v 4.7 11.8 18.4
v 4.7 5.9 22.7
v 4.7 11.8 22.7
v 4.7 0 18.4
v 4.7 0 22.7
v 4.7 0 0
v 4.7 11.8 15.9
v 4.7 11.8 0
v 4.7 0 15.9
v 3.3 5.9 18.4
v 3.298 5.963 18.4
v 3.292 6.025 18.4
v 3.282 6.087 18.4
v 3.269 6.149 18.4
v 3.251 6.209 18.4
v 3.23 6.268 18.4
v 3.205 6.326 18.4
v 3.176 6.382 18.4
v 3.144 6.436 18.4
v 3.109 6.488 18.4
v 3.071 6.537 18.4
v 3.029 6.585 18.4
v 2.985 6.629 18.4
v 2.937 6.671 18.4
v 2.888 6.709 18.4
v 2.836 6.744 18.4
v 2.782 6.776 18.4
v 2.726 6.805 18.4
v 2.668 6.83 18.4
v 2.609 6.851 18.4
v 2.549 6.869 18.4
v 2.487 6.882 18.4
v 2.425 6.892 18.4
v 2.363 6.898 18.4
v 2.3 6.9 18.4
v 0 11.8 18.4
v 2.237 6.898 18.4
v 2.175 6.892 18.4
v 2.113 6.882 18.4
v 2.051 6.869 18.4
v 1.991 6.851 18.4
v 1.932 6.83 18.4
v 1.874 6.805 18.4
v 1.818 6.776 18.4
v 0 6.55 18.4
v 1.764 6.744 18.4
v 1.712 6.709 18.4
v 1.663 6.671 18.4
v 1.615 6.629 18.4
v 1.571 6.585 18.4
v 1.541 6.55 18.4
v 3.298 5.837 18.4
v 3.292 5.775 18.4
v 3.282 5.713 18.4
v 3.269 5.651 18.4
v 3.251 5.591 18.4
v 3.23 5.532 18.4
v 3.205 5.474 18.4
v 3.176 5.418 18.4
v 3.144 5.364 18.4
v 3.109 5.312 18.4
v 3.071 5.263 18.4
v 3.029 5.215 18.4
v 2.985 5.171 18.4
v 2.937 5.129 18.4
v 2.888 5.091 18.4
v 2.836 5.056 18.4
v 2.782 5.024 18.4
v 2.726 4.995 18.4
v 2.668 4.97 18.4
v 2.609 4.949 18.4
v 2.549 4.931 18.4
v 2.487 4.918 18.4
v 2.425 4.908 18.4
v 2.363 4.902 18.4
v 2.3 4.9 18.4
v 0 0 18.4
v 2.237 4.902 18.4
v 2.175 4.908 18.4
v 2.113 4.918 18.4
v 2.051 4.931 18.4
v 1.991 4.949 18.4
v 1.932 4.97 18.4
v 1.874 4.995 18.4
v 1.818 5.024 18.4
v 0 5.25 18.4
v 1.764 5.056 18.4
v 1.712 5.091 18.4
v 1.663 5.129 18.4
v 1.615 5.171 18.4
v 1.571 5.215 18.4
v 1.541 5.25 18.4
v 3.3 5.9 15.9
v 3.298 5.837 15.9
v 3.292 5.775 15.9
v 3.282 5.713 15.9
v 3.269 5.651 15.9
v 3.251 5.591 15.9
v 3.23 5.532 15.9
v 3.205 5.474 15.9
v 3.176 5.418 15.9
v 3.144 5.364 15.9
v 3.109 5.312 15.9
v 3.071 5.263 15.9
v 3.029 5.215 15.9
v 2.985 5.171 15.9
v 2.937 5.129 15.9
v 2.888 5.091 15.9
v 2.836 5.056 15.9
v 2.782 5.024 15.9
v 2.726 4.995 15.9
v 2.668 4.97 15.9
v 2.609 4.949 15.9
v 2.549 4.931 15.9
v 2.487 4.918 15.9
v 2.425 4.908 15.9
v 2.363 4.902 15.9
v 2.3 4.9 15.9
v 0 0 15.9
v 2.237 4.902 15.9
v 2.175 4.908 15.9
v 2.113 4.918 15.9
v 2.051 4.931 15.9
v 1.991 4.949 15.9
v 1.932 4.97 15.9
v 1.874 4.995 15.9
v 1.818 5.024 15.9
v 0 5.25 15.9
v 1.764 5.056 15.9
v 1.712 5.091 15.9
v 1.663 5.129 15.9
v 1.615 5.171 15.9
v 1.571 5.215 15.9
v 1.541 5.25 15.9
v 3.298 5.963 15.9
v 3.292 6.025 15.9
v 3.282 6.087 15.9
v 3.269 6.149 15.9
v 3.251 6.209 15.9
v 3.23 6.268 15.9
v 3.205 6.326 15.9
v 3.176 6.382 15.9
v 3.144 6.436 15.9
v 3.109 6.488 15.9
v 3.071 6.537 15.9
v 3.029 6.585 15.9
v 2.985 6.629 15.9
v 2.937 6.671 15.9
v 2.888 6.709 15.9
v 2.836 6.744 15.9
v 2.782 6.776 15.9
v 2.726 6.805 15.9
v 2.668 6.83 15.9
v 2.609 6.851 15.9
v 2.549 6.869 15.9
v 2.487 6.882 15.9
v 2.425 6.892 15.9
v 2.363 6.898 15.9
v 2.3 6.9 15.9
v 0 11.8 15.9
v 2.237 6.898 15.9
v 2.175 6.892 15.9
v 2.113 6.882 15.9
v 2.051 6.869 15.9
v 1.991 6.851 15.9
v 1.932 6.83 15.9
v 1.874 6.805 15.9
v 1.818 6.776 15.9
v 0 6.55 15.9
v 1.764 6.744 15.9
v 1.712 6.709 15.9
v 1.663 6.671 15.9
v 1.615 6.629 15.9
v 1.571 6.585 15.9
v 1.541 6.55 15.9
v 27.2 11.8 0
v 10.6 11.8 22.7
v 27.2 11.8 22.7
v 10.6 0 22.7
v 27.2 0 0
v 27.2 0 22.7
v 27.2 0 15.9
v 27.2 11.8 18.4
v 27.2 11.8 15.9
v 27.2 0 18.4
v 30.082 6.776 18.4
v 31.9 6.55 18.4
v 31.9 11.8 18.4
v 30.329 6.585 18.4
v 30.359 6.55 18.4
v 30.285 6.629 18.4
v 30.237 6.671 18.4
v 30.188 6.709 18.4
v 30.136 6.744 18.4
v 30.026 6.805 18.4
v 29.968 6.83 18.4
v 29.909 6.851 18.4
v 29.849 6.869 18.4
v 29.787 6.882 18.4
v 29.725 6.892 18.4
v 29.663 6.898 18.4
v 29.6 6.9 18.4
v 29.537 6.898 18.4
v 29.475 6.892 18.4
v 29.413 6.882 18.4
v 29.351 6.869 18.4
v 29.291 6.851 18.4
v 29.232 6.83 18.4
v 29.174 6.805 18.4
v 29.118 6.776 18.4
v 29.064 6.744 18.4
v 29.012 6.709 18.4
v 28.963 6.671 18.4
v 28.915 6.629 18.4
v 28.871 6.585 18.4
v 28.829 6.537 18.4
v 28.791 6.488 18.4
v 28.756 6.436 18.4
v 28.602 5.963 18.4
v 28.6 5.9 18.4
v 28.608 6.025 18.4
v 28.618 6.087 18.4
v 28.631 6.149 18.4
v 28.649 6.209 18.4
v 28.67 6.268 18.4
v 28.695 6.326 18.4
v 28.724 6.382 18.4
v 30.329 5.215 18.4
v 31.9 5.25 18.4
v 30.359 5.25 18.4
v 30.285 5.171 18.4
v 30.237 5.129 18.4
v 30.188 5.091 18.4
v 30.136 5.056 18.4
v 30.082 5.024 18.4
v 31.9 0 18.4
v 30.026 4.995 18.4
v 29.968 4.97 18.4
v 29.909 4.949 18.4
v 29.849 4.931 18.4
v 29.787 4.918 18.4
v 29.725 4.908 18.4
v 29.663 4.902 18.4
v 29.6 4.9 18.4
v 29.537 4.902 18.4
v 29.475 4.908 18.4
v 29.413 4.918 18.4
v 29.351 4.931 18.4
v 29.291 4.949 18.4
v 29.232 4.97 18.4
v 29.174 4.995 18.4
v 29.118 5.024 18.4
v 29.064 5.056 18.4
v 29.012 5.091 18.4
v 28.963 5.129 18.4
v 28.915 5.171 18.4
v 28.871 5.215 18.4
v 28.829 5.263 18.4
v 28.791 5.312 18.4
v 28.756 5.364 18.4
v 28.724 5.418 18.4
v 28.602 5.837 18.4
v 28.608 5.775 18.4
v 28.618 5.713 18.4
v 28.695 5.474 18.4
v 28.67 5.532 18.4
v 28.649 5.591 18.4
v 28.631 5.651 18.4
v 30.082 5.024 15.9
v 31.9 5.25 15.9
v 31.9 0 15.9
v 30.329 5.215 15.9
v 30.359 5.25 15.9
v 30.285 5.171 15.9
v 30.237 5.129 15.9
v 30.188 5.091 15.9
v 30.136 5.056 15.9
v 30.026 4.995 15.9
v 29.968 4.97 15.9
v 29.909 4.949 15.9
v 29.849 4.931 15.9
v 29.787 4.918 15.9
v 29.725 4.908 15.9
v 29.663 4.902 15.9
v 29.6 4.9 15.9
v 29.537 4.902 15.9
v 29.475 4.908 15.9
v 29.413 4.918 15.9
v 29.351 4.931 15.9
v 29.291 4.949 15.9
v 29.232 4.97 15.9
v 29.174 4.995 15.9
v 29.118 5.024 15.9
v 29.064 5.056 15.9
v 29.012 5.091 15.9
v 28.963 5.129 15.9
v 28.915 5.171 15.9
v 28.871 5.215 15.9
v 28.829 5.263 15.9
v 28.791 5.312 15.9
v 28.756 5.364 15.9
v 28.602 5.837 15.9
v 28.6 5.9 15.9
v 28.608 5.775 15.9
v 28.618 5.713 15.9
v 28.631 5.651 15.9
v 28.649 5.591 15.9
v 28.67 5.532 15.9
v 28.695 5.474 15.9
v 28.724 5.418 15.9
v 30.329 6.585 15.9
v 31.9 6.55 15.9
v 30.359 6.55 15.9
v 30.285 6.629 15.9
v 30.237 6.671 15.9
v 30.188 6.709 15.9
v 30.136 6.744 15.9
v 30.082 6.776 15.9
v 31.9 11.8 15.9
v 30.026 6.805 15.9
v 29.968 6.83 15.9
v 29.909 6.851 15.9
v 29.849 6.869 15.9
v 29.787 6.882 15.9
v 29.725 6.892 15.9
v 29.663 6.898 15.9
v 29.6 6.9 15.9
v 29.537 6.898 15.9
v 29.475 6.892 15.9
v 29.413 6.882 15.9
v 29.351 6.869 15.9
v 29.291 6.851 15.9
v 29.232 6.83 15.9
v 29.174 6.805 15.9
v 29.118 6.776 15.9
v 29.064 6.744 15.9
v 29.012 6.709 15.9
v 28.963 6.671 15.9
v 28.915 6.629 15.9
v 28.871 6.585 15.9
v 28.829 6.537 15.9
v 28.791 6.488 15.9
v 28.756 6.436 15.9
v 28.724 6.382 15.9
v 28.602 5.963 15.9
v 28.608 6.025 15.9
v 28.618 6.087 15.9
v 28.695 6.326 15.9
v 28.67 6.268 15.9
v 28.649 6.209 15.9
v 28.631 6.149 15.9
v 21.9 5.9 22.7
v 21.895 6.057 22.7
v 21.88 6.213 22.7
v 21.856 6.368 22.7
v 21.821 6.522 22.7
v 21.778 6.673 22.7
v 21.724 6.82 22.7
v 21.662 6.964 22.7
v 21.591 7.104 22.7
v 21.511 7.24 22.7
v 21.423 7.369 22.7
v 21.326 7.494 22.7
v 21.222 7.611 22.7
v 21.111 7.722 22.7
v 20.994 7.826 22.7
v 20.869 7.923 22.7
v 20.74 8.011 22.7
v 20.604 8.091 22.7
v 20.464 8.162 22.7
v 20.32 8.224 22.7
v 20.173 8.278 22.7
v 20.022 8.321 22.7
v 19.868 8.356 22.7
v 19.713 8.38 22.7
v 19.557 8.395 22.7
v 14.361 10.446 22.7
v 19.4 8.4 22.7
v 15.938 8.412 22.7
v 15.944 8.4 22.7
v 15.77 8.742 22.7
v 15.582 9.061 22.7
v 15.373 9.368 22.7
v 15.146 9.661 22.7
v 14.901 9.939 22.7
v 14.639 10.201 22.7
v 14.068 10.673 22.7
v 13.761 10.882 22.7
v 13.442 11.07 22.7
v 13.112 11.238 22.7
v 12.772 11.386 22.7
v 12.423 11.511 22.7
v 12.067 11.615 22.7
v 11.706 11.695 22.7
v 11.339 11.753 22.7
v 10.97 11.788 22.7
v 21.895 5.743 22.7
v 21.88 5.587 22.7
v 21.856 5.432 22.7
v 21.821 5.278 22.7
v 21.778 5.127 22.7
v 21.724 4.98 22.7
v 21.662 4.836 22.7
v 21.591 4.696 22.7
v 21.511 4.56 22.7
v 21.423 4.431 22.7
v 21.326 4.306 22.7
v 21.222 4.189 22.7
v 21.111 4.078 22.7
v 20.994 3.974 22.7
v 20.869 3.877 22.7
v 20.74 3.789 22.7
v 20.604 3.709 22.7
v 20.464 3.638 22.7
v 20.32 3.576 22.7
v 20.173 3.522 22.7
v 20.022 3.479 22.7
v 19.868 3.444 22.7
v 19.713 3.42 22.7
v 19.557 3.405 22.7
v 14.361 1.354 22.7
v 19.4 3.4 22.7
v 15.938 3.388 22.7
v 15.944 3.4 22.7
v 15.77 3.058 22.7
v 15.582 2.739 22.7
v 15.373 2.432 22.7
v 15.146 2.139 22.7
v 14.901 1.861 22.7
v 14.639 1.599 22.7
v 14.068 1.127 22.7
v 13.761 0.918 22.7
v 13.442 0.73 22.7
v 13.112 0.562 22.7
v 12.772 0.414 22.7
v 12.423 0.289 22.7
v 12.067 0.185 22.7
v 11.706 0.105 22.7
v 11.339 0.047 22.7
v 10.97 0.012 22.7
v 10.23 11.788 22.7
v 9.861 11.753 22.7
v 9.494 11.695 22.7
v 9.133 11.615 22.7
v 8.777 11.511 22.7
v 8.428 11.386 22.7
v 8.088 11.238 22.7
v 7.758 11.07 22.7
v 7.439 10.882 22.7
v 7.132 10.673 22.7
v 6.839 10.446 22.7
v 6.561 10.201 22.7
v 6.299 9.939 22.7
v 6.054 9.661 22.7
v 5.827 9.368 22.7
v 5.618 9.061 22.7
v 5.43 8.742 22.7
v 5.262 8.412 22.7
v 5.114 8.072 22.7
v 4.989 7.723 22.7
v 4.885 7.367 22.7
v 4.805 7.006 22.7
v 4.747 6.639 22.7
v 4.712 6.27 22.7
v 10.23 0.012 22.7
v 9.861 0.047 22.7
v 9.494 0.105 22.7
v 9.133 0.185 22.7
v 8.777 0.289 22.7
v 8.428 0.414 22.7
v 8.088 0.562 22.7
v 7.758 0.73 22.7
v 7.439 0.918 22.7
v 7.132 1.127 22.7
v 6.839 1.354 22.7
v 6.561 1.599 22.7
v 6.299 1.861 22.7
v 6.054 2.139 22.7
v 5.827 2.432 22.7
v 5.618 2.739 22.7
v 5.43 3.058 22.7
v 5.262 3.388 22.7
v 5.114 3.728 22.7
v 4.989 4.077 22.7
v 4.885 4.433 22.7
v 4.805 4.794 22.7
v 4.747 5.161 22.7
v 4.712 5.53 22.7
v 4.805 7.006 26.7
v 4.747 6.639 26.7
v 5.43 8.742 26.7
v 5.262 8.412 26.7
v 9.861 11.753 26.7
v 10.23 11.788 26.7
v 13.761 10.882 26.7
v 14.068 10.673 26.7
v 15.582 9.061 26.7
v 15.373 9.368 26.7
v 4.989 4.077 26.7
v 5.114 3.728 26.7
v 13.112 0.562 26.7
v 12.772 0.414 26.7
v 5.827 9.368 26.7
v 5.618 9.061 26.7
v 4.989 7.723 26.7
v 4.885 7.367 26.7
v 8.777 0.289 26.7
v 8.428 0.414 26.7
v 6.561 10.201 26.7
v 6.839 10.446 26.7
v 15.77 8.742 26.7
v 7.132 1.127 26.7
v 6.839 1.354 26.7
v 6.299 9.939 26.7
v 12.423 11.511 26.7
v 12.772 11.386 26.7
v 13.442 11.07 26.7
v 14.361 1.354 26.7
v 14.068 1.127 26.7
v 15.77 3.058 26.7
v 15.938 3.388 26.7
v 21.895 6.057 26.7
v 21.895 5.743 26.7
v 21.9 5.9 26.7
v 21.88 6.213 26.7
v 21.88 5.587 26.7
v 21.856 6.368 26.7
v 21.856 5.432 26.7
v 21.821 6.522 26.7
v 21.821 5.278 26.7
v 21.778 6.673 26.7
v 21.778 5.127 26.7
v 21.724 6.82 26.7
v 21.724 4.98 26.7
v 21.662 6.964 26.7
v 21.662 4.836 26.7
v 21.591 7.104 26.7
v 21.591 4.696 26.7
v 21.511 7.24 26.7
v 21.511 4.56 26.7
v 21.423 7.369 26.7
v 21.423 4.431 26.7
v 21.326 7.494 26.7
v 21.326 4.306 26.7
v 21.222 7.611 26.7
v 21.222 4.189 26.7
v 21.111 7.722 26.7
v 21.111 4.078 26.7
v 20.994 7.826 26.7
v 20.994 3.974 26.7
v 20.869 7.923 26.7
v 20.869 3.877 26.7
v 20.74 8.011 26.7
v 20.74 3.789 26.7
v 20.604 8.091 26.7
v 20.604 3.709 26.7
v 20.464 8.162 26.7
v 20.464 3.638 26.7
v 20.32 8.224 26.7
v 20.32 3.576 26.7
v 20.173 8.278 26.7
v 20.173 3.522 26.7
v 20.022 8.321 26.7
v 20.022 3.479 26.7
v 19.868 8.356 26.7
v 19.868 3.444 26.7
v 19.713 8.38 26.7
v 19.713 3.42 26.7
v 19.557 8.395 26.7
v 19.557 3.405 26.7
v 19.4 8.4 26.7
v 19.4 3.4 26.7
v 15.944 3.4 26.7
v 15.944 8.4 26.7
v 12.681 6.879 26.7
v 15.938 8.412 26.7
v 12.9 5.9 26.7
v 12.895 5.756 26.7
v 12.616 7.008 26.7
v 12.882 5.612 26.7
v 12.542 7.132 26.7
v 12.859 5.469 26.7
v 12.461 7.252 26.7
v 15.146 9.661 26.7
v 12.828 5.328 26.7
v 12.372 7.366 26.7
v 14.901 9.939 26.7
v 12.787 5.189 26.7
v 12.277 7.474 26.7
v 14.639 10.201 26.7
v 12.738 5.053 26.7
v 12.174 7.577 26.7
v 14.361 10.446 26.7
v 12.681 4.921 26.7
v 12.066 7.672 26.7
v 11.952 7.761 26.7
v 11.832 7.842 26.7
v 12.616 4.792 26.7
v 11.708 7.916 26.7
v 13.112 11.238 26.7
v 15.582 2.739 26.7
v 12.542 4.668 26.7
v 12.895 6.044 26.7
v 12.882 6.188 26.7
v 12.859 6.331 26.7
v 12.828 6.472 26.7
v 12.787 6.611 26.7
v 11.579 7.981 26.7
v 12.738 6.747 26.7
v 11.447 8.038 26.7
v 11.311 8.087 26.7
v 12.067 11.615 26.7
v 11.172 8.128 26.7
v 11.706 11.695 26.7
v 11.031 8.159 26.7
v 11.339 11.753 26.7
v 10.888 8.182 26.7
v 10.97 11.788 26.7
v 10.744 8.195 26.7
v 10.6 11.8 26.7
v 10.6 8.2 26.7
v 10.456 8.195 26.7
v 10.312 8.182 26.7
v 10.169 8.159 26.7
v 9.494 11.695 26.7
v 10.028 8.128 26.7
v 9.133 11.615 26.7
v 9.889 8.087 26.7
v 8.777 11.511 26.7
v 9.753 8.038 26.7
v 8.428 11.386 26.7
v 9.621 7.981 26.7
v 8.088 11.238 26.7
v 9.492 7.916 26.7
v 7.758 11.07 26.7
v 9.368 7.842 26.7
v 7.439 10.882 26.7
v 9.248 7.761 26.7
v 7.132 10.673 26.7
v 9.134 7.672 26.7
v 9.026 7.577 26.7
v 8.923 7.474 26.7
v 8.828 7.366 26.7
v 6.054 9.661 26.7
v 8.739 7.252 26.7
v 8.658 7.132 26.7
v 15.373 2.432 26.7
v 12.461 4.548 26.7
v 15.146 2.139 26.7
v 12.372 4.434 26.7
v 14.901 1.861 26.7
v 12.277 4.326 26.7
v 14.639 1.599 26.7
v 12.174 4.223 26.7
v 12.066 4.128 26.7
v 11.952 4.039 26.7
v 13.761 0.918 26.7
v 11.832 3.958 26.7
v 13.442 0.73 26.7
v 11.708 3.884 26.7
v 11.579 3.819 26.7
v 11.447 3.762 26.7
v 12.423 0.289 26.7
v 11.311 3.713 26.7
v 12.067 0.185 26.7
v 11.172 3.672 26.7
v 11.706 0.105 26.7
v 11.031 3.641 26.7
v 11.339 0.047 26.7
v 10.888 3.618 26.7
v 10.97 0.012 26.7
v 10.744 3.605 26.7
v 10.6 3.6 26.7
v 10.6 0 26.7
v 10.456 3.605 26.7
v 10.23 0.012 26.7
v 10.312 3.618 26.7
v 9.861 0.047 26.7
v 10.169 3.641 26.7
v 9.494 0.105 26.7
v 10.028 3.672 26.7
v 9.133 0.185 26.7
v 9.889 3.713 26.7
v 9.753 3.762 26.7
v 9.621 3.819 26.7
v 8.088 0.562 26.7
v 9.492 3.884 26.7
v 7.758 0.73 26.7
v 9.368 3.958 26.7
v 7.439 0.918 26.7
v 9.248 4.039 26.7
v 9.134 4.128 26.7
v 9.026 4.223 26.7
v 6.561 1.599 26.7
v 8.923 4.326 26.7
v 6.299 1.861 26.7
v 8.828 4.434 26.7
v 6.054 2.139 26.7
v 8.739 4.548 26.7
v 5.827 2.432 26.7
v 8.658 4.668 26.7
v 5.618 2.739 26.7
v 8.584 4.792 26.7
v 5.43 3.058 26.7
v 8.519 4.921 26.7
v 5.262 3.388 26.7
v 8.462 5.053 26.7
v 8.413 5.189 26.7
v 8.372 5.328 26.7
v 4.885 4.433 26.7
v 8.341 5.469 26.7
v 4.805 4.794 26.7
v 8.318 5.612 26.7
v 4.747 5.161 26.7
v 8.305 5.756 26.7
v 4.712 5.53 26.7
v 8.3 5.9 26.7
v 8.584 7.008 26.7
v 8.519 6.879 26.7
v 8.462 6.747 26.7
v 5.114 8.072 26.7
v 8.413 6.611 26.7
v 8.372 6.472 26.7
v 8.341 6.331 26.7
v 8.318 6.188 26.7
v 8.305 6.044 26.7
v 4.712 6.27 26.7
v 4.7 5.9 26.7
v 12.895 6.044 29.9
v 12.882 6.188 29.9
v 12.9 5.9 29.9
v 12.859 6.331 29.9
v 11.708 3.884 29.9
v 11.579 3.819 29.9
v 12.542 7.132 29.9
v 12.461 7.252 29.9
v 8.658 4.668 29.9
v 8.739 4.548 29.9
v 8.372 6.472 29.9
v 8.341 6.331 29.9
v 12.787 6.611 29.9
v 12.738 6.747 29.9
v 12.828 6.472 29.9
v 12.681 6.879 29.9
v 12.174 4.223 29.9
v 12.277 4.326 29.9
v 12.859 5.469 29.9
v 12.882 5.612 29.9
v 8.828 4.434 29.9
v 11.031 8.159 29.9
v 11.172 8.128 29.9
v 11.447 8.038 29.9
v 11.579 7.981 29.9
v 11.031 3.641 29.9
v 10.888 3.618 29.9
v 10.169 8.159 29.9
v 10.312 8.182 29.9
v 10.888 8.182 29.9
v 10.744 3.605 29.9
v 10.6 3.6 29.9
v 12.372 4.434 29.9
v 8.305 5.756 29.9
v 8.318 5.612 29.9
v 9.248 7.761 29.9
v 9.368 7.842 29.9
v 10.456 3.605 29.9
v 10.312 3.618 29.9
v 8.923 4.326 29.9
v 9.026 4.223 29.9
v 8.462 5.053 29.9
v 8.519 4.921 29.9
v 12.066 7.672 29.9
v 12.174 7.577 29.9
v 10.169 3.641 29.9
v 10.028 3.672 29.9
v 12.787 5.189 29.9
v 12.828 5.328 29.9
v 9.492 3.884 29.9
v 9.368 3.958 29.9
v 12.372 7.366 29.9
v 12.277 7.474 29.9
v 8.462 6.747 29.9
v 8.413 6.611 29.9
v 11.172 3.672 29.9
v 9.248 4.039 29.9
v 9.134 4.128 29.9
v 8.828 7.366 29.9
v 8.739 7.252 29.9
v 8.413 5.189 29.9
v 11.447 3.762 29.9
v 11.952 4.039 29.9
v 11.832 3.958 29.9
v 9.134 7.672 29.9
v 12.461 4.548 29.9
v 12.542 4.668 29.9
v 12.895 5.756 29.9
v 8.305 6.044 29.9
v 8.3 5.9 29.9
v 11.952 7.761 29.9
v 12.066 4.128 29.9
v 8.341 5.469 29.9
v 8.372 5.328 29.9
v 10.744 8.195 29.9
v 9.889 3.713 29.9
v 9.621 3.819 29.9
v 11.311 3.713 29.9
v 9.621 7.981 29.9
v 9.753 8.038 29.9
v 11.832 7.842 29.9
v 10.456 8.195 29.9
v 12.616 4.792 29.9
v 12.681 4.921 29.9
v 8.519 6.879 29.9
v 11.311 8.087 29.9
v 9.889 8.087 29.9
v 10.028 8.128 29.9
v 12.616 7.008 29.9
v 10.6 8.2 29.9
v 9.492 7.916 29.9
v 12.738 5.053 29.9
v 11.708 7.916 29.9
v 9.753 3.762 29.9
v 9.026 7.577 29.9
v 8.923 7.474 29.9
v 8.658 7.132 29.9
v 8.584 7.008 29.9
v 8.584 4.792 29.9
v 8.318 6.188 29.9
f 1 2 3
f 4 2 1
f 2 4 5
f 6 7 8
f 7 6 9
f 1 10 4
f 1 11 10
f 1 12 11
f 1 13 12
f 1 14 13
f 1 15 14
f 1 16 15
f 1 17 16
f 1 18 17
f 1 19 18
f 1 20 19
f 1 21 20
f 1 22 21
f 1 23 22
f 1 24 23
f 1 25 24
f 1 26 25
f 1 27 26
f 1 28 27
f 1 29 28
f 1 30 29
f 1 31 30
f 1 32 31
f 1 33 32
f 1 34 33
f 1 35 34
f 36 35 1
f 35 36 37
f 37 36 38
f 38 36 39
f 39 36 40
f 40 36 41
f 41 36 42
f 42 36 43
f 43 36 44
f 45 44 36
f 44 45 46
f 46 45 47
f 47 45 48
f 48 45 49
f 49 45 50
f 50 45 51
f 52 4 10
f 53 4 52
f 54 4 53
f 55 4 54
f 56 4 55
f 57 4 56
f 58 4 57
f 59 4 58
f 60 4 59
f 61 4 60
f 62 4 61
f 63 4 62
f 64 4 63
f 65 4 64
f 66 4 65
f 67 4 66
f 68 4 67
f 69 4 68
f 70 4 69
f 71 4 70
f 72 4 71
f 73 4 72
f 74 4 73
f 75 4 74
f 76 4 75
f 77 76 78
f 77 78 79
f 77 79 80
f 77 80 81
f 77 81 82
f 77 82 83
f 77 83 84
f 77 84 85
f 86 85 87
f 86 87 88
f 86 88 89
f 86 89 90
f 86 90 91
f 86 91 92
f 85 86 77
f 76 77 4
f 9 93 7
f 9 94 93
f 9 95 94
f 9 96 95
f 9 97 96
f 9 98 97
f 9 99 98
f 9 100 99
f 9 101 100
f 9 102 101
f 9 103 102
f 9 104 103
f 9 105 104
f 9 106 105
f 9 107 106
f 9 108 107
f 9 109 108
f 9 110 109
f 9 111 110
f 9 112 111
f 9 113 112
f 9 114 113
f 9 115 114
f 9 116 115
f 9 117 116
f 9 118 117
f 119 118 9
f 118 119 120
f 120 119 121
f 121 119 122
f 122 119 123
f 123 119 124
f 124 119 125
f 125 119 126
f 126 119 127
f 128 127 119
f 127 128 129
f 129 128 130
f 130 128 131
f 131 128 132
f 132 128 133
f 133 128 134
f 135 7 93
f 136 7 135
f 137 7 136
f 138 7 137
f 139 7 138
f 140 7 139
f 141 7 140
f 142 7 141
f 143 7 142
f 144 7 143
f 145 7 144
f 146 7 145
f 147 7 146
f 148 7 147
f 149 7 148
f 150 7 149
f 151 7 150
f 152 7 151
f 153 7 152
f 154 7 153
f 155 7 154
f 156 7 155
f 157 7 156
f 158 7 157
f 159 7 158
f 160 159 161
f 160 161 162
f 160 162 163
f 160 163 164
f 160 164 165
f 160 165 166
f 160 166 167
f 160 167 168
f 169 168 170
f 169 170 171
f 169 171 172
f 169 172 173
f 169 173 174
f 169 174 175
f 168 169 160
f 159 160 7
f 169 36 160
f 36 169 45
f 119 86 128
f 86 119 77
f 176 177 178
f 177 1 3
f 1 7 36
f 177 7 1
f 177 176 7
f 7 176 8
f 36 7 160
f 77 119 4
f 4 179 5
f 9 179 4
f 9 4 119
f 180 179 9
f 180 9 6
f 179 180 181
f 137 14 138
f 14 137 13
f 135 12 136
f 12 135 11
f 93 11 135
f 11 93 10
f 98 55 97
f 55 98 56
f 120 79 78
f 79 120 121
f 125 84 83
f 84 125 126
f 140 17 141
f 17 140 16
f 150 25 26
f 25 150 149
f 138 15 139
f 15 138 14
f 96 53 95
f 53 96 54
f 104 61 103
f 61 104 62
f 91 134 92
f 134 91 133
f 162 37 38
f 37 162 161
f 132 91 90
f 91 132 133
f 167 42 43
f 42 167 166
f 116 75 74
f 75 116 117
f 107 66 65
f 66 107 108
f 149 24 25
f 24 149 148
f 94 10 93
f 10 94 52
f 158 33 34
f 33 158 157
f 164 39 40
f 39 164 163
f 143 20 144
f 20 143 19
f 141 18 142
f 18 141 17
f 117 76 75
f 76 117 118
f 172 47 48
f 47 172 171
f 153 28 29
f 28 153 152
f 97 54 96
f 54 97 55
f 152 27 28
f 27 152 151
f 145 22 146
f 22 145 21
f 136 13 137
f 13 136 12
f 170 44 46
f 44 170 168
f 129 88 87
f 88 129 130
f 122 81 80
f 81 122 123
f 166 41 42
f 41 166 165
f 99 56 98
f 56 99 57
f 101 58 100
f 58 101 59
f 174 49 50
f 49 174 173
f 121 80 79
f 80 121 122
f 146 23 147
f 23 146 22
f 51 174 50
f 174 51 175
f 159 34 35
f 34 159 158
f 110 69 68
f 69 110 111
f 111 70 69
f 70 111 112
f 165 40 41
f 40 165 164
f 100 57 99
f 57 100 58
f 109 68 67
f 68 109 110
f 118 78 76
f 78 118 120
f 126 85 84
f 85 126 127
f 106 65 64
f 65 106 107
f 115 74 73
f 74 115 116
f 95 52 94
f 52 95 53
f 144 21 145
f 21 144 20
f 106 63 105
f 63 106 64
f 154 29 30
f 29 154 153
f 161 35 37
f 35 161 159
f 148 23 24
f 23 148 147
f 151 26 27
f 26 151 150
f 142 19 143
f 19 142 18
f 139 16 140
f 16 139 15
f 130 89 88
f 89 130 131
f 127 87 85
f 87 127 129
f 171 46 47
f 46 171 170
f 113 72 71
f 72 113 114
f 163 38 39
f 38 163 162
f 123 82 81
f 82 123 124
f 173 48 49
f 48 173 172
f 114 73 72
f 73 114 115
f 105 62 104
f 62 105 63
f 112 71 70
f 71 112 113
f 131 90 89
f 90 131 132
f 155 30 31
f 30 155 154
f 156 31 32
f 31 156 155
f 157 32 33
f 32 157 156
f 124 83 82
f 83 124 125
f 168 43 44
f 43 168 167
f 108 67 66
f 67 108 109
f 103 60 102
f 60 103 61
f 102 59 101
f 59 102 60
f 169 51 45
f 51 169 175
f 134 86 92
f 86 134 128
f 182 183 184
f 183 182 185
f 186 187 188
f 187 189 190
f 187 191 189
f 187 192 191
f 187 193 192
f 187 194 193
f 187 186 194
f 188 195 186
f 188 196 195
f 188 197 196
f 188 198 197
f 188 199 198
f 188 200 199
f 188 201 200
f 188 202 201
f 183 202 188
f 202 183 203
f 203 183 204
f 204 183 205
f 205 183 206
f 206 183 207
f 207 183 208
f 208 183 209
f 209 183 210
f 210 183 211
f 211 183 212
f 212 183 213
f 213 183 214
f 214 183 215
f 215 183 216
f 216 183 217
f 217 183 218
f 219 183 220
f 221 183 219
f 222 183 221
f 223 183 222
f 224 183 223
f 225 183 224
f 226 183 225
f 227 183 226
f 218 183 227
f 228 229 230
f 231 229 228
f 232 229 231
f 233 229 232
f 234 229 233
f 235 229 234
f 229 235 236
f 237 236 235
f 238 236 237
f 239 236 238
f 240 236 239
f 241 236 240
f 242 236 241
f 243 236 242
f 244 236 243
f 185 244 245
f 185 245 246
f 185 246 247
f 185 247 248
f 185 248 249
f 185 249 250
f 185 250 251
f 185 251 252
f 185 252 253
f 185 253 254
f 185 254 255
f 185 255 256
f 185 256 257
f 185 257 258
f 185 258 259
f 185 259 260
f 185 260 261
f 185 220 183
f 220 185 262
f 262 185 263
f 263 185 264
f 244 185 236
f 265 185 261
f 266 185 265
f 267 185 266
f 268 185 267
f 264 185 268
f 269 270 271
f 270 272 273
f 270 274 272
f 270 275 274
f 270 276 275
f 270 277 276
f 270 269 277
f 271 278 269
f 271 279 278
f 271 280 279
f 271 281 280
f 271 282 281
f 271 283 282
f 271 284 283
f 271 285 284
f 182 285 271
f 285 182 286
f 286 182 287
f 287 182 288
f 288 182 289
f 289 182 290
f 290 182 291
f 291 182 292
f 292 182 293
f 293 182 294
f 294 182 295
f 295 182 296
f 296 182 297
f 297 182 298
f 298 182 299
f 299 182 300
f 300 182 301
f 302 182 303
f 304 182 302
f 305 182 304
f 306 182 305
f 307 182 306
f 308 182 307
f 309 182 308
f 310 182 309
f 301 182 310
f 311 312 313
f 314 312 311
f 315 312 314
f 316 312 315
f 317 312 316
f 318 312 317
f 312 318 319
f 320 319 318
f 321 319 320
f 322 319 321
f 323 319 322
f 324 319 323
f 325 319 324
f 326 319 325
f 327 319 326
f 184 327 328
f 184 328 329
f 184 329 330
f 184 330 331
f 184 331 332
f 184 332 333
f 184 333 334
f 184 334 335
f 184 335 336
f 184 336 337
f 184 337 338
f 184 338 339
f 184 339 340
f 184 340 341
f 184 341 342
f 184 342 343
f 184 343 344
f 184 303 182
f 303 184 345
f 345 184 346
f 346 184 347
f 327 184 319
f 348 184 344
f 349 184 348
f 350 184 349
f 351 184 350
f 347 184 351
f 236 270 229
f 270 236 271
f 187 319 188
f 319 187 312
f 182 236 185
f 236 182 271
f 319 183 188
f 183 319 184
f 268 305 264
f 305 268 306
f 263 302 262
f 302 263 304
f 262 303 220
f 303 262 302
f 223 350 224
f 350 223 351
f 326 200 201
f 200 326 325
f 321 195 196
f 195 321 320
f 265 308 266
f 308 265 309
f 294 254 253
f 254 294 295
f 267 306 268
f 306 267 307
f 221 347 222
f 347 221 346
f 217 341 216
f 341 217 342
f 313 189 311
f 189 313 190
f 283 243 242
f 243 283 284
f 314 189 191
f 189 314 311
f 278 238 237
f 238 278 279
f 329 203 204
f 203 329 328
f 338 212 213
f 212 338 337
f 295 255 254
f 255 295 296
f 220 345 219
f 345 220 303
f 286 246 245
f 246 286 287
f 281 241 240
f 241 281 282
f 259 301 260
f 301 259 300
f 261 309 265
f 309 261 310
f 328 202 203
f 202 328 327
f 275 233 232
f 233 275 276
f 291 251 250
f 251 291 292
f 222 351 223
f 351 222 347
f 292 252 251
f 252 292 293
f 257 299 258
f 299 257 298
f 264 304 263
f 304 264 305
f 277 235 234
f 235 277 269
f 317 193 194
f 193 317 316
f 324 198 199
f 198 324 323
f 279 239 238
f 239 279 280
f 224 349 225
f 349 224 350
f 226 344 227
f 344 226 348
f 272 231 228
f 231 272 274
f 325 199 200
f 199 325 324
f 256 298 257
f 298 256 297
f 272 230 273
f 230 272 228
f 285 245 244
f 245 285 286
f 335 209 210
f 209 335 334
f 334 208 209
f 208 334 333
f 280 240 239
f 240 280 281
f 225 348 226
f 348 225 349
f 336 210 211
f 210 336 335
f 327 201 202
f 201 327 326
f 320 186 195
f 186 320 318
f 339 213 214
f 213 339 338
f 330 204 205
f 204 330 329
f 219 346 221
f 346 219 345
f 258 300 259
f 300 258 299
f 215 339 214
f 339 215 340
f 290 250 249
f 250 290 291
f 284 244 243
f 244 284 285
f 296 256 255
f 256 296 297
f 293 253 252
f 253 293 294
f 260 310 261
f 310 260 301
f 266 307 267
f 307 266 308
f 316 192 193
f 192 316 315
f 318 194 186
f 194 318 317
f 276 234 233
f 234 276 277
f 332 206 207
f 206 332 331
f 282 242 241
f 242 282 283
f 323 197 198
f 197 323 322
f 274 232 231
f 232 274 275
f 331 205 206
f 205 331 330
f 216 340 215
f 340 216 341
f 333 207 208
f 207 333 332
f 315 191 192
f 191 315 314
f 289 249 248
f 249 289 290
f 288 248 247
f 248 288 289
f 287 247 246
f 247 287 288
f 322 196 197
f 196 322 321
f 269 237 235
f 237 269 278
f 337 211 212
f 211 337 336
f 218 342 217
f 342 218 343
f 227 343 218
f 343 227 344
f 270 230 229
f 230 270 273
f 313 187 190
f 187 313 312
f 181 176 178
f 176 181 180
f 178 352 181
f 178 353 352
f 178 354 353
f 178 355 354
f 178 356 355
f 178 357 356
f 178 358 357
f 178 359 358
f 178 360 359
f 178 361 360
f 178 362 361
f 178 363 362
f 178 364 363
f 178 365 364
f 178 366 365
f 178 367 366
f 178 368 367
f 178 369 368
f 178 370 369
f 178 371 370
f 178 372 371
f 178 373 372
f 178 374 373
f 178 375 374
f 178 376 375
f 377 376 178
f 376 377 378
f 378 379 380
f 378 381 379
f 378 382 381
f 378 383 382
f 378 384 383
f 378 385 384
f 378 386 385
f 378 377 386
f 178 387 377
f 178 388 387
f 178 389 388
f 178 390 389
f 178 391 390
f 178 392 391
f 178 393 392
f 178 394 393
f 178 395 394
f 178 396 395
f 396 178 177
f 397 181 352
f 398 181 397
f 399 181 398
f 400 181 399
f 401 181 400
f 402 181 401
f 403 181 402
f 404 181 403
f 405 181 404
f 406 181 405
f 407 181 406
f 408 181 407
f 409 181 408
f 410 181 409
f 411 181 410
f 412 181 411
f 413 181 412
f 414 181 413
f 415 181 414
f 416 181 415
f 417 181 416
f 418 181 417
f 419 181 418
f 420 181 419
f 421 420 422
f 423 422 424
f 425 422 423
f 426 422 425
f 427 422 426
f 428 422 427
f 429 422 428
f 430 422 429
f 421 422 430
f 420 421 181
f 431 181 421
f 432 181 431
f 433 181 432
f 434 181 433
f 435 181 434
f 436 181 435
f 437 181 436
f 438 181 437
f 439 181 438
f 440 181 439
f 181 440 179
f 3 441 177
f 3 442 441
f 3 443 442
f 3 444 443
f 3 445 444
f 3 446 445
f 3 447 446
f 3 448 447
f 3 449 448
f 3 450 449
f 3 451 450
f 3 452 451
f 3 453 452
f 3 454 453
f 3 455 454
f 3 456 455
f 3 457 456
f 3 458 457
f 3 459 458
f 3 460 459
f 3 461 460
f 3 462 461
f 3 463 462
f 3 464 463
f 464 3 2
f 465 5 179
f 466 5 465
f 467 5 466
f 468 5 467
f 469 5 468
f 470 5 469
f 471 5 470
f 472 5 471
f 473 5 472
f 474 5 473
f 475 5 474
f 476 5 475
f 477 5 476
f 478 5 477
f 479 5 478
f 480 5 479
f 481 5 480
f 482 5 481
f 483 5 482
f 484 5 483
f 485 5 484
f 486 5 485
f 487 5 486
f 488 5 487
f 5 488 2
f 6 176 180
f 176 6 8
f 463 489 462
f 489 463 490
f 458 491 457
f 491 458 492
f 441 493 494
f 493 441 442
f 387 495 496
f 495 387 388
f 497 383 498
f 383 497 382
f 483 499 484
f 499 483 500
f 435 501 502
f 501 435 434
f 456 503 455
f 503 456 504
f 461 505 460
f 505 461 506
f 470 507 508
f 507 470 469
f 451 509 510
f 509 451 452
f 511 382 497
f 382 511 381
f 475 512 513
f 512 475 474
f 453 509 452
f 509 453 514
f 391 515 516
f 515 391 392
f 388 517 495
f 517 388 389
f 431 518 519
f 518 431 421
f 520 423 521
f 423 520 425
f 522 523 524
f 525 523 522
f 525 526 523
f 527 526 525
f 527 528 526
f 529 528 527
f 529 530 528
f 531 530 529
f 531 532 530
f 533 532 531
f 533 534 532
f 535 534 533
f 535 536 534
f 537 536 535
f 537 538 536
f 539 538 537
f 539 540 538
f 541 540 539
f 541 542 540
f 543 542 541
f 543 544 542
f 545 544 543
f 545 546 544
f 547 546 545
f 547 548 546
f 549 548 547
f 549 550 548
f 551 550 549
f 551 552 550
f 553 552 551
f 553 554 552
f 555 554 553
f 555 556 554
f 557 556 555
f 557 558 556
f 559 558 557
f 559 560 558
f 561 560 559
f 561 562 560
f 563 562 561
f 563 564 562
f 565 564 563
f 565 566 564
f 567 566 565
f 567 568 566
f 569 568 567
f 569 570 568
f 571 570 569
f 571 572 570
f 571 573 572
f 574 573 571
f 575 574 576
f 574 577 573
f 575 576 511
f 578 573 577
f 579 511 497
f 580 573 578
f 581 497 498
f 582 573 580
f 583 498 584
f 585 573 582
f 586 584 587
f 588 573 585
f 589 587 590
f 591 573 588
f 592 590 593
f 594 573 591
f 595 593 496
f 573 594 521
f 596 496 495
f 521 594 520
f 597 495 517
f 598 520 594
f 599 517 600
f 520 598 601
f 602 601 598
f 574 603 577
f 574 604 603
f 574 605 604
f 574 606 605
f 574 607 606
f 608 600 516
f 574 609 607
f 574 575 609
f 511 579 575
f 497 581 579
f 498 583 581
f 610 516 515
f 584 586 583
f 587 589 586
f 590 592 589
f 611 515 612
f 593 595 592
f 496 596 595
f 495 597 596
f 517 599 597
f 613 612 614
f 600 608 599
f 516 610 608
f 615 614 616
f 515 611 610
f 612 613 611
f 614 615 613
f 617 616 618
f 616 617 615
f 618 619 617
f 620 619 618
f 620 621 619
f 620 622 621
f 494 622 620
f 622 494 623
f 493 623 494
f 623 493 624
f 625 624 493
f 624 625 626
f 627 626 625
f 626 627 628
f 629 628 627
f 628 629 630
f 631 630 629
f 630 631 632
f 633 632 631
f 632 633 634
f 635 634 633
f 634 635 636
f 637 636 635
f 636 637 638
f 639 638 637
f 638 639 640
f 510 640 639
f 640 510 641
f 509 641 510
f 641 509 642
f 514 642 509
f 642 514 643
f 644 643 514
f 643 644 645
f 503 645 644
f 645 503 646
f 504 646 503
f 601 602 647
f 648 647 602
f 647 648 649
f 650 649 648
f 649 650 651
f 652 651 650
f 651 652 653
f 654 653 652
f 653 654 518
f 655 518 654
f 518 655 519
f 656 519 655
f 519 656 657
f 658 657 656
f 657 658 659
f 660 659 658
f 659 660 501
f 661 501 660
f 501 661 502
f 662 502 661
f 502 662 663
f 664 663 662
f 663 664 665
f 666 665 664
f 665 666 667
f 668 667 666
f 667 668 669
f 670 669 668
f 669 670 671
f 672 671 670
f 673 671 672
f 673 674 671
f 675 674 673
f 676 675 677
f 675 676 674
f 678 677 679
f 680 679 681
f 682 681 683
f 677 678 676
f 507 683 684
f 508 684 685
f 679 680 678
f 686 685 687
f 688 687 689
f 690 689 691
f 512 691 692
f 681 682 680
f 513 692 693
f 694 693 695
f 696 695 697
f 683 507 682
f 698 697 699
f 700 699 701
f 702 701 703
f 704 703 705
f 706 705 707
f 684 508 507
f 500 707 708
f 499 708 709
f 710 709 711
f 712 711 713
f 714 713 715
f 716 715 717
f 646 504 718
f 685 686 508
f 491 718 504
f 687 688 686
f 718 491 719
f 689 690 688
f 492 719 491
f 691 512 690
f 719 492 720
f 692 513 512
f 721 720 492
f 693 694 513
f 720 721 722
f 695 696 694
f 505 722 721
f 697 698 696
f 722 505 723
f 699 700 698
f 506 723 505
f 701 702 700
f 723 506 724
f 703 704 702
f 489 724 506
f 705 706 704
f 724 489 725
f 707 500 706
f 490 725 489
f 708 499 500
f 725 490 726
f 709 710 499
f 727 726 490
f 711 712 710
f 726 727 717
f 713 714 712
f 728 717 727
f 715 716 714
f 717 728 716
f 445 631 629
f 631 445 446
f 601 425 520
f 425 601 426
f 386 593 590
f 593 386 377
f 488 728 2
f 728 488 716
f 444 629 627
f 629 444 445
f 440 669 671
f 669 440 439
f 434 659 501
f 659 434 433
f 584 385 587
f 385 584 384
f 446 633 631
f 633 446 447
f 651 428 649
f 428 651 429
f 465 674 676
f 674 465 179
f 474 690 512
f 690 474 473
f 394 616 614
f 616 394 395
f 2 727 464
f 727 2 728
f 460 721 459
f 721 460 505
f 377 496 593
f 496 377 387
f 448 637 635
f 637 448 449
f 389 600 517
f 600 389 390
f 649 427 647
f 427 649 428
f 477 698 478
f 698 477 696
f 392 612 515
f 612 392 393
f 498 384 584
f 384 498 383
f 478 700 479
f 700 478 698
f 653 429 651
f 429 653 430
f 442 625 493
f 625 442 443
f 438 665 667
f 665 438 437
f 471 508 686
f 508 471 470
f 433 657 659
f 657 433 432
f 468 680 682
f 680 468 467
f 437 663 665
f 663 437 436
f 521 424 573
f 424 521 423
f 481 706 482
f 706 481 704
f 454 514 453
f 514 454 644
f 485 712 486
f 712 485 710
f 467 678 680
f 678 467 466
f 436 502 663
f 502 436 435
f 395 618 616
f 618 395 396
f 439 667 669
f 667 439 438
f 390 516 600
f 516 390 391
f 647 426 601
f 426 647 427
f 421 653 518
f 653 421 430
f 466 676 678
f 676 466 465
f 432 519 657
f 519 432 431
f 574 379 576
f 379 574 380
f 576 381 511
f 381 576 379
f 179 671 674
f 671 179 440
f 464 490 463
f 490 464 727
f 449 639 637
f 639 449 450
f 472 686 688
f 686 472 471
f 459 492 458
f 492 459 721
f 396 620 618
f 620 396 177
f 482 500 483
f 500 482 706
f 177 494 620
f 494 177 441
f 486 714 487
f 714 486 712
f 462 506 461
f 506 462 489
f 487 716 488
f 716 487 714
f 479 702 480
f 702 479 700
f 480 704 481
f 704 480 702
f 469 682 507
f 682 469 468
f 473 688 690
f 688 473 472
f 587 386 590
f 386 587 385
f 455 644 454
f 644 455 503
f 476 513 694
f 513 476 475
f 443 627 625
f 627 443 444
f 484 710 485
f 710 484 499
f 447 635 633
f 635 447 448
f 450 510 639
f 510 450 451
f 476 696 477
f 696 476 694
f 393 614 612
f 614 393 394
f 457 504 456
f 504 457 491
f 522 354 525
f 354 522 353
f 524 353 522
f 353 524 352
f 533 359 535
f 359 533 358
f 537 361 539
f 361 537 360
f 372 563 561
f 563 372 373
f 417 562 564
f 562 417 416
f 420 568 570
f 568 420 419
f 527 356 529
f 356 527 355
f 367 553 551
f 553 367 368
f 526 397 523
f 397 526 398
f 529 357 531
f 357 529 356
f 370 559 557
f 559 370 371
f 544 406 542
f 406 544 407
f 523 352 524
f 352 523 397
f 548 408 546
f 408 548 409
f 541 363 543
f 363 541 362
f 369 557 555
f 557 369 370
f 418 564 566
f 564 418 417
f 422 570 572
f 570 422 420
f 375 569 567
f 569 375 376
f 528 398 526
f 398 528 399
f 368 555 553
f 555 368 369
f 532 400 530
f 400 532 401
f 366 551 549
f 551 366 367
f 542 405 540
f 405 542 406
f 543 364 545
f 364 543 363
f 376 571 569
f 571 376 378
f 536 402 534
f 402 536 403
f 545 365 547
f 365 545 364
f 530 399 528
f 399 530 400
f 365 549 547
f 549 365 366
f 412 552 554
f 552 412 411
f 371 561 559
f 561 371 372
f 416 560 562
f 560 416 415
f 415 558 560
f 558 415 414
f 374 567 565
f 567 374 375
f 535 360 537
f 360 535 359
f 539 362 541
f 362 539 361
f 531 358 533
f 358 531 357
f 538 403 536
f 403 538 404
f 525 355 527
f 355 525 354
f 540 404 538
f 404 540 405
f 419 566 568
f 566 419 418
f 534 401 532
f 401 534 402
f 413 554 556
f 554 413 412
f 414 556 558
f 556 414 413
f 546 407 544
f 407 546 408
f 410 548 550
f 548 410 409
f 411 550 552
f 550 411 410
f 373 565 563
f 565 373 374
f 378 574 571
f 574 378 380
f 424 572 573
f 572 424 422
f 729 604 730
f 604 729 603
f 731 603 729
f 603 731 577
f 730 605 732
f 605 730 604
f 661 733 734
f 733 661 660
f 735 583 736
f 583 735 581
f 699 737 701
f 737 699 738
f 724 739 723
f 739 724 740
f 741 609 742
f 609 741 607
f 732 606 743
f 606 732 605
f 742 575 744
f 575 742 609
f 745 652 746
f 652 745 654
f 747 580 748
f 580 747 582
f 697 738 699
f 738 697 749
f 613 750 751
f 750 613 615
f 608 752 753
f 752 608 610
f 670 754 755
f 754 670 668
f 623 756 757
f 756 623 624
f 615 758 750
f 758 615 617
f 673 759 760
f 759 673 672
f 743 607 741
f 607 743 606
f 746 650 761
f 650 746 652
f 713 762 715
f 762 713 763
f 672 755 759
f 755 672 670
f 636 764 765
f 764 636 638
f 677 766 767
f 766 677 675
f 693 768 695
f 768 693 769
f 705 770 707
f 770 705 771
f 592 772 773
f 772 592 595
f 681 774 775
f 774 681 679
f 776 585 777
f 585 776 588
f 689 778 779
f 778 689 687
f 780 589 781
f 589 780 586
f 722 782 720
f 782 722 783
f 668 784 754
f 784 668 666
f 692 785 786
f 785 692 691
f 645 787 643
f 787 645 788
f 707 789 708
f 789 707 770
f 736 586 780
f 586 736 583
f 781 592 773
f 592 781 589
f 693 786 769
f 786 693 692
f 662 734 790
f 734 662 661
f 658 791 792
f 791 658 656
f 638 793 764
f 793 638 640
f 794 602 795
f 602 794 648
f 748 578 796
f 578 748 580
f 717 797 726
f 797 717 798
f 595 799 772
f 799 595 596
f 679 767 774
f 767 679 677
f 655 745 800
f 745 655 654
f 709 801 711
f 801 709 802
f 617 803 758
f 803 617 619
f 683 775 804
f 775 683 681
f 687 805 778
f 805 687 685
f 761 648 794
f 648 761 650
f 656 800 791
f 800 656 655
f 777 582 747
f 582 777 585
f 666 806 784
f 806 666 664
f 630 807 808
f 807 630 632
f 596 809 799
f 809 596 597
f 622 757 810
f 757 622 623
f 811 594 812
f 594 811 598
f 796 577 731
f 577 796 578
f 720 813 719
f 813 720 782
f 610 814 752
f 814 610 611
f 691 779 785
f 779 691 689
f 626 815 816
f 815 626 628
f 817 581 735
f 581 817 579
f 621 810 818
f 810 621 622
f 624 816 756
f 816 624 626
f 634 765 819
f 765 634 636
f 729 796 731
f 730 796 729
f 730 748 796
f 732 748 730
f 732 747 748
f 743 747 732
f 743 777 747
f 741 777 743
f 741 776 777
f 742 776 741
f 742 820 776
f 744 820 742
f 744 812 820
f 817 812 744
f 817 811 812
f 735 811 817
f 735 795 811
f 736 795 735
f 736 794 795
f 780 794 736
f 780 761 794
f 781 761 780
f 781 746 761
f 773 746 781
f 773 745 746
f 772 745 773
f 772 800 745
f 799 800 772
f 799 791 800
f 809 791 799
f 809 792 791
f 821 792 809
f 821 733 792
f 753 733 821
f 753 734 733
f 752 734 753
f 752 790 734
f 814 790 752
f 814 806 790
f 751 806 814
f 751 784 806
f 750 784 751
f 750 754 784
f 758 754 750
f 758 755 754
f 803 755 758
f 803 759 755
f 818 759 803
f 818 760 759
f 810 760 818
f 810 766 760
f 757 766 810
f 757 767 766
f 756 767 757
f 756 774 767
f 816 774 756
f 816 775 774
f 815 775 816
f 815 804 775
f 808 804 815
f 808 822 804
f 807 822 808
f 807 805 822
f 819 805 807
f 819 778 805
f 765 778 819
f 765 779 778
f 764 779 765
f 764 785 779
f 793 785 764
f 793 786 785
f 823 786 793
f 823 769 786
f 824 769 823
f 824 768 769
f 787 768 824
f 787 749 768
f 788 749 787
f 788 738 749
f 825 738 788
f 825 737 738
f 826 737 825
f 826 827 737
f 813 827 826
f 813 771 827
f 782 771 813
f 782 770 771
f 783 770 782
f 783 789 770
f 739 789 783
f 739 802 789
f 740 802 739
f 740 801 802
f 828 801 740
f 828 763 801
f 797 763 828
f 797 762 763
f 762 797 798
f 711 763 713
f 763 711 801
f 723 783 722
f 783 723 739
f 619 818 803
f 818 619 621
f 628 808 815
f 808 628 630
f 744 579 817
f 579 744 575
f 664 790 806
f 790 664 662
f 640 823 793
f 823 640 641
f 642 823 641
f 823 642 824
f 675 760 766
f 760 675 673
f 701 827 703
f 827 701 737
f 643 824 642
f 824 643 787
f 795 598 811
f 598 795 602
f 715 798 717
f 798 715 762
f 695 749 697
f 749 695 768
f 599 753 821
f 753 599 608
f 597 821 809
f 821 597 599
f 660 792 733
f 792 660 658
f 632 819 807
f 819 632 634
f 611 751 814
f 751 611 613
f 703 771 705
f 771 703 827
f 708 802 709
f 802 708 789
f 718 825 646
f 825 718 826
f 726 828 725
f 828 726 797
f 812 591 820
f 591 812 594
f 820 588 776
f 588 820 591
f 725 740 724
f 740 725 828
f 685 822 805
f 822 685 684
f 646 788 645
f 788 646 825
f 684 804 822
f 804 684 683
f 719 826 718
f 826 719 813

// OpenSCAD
servo_box_length=22.5;
servo_box_width=11.8;
servo_box_height=22.7;

servo_cog_height=4;
servo_lcog_radius=11.8/2;
servo_scog_radius=5/2;
servo_scog_offset=2.9;

falange_length=4.7;
falange_height=2.5;
falange_offset=18.4-falange_height;

falange_screw_offset=2.3;
falange_screw_radius=2/2;
falange_screw_slot=1.3;

horn_height=3.2;
horn_radius=4.6/2;

module servo_falange(){    
    difference(){
        cube(size=[falange_length,servo_box_width,falange_height]);
        
        translate([falange_screw_offset,servo_box_width/2,-1])
        cylinder(falange_height+2,falange_screw_radius,falange_screw_radius,$fn=100);
        
        translate([-1,servo_box_width/2-falange_screw_slot/2,-1])
        cube(size=[1+falange_screw_offset,falange_screw_slot,falange_height+2]);
    }
}

module servo(){
    
    // Servo Box
    translate([falange_length,0,0])
    cube(size=[servo_box_length,servo_box_width,servo_box_height]);
    
    // Large Cog
    translate([servo_lcog_radius+falange_length,servo_box_width/2,servo_box_height])
    cylinder(servo_cog_height,servo_lcog_radius,servo_lcog_radius,$fn=100);
    
    // Small Cog
    translate([servo_lcog_radius*2+falange_length+servo_scog_offset,servo_box_width/2,servo_box_height])
    cylinder(servo_cog_height,servo_scog_radius,servo_scog_radius,$fn=100);
    
    translate([servo_lcog_radius*2+falange_length+servo_scog_offset-servo_scog_radius,servo_box_width/2,servo_box_height+2])
    cube(size=[servo_scog_radius*2,servo_scog_radius*2,servo_cog_height],center=true);
   
    // Obverse Falange
    translate([0,0,falange_offset])
    servo_falange();
    
    // Reverse Falange
    translate([servo_box_length+falange_length*2,servo_box_width,falange_offset])
    rotate([0,0,180])
    servo_falange();
    
    // Horn Mount
    translate([falange_length+servo_lcog_radius,servo_box_width/2,servo_box_height+servo_cog_height])
    cylinder(horn_height,horn_radius,horn_radius,$fn=100);
}

servo();
